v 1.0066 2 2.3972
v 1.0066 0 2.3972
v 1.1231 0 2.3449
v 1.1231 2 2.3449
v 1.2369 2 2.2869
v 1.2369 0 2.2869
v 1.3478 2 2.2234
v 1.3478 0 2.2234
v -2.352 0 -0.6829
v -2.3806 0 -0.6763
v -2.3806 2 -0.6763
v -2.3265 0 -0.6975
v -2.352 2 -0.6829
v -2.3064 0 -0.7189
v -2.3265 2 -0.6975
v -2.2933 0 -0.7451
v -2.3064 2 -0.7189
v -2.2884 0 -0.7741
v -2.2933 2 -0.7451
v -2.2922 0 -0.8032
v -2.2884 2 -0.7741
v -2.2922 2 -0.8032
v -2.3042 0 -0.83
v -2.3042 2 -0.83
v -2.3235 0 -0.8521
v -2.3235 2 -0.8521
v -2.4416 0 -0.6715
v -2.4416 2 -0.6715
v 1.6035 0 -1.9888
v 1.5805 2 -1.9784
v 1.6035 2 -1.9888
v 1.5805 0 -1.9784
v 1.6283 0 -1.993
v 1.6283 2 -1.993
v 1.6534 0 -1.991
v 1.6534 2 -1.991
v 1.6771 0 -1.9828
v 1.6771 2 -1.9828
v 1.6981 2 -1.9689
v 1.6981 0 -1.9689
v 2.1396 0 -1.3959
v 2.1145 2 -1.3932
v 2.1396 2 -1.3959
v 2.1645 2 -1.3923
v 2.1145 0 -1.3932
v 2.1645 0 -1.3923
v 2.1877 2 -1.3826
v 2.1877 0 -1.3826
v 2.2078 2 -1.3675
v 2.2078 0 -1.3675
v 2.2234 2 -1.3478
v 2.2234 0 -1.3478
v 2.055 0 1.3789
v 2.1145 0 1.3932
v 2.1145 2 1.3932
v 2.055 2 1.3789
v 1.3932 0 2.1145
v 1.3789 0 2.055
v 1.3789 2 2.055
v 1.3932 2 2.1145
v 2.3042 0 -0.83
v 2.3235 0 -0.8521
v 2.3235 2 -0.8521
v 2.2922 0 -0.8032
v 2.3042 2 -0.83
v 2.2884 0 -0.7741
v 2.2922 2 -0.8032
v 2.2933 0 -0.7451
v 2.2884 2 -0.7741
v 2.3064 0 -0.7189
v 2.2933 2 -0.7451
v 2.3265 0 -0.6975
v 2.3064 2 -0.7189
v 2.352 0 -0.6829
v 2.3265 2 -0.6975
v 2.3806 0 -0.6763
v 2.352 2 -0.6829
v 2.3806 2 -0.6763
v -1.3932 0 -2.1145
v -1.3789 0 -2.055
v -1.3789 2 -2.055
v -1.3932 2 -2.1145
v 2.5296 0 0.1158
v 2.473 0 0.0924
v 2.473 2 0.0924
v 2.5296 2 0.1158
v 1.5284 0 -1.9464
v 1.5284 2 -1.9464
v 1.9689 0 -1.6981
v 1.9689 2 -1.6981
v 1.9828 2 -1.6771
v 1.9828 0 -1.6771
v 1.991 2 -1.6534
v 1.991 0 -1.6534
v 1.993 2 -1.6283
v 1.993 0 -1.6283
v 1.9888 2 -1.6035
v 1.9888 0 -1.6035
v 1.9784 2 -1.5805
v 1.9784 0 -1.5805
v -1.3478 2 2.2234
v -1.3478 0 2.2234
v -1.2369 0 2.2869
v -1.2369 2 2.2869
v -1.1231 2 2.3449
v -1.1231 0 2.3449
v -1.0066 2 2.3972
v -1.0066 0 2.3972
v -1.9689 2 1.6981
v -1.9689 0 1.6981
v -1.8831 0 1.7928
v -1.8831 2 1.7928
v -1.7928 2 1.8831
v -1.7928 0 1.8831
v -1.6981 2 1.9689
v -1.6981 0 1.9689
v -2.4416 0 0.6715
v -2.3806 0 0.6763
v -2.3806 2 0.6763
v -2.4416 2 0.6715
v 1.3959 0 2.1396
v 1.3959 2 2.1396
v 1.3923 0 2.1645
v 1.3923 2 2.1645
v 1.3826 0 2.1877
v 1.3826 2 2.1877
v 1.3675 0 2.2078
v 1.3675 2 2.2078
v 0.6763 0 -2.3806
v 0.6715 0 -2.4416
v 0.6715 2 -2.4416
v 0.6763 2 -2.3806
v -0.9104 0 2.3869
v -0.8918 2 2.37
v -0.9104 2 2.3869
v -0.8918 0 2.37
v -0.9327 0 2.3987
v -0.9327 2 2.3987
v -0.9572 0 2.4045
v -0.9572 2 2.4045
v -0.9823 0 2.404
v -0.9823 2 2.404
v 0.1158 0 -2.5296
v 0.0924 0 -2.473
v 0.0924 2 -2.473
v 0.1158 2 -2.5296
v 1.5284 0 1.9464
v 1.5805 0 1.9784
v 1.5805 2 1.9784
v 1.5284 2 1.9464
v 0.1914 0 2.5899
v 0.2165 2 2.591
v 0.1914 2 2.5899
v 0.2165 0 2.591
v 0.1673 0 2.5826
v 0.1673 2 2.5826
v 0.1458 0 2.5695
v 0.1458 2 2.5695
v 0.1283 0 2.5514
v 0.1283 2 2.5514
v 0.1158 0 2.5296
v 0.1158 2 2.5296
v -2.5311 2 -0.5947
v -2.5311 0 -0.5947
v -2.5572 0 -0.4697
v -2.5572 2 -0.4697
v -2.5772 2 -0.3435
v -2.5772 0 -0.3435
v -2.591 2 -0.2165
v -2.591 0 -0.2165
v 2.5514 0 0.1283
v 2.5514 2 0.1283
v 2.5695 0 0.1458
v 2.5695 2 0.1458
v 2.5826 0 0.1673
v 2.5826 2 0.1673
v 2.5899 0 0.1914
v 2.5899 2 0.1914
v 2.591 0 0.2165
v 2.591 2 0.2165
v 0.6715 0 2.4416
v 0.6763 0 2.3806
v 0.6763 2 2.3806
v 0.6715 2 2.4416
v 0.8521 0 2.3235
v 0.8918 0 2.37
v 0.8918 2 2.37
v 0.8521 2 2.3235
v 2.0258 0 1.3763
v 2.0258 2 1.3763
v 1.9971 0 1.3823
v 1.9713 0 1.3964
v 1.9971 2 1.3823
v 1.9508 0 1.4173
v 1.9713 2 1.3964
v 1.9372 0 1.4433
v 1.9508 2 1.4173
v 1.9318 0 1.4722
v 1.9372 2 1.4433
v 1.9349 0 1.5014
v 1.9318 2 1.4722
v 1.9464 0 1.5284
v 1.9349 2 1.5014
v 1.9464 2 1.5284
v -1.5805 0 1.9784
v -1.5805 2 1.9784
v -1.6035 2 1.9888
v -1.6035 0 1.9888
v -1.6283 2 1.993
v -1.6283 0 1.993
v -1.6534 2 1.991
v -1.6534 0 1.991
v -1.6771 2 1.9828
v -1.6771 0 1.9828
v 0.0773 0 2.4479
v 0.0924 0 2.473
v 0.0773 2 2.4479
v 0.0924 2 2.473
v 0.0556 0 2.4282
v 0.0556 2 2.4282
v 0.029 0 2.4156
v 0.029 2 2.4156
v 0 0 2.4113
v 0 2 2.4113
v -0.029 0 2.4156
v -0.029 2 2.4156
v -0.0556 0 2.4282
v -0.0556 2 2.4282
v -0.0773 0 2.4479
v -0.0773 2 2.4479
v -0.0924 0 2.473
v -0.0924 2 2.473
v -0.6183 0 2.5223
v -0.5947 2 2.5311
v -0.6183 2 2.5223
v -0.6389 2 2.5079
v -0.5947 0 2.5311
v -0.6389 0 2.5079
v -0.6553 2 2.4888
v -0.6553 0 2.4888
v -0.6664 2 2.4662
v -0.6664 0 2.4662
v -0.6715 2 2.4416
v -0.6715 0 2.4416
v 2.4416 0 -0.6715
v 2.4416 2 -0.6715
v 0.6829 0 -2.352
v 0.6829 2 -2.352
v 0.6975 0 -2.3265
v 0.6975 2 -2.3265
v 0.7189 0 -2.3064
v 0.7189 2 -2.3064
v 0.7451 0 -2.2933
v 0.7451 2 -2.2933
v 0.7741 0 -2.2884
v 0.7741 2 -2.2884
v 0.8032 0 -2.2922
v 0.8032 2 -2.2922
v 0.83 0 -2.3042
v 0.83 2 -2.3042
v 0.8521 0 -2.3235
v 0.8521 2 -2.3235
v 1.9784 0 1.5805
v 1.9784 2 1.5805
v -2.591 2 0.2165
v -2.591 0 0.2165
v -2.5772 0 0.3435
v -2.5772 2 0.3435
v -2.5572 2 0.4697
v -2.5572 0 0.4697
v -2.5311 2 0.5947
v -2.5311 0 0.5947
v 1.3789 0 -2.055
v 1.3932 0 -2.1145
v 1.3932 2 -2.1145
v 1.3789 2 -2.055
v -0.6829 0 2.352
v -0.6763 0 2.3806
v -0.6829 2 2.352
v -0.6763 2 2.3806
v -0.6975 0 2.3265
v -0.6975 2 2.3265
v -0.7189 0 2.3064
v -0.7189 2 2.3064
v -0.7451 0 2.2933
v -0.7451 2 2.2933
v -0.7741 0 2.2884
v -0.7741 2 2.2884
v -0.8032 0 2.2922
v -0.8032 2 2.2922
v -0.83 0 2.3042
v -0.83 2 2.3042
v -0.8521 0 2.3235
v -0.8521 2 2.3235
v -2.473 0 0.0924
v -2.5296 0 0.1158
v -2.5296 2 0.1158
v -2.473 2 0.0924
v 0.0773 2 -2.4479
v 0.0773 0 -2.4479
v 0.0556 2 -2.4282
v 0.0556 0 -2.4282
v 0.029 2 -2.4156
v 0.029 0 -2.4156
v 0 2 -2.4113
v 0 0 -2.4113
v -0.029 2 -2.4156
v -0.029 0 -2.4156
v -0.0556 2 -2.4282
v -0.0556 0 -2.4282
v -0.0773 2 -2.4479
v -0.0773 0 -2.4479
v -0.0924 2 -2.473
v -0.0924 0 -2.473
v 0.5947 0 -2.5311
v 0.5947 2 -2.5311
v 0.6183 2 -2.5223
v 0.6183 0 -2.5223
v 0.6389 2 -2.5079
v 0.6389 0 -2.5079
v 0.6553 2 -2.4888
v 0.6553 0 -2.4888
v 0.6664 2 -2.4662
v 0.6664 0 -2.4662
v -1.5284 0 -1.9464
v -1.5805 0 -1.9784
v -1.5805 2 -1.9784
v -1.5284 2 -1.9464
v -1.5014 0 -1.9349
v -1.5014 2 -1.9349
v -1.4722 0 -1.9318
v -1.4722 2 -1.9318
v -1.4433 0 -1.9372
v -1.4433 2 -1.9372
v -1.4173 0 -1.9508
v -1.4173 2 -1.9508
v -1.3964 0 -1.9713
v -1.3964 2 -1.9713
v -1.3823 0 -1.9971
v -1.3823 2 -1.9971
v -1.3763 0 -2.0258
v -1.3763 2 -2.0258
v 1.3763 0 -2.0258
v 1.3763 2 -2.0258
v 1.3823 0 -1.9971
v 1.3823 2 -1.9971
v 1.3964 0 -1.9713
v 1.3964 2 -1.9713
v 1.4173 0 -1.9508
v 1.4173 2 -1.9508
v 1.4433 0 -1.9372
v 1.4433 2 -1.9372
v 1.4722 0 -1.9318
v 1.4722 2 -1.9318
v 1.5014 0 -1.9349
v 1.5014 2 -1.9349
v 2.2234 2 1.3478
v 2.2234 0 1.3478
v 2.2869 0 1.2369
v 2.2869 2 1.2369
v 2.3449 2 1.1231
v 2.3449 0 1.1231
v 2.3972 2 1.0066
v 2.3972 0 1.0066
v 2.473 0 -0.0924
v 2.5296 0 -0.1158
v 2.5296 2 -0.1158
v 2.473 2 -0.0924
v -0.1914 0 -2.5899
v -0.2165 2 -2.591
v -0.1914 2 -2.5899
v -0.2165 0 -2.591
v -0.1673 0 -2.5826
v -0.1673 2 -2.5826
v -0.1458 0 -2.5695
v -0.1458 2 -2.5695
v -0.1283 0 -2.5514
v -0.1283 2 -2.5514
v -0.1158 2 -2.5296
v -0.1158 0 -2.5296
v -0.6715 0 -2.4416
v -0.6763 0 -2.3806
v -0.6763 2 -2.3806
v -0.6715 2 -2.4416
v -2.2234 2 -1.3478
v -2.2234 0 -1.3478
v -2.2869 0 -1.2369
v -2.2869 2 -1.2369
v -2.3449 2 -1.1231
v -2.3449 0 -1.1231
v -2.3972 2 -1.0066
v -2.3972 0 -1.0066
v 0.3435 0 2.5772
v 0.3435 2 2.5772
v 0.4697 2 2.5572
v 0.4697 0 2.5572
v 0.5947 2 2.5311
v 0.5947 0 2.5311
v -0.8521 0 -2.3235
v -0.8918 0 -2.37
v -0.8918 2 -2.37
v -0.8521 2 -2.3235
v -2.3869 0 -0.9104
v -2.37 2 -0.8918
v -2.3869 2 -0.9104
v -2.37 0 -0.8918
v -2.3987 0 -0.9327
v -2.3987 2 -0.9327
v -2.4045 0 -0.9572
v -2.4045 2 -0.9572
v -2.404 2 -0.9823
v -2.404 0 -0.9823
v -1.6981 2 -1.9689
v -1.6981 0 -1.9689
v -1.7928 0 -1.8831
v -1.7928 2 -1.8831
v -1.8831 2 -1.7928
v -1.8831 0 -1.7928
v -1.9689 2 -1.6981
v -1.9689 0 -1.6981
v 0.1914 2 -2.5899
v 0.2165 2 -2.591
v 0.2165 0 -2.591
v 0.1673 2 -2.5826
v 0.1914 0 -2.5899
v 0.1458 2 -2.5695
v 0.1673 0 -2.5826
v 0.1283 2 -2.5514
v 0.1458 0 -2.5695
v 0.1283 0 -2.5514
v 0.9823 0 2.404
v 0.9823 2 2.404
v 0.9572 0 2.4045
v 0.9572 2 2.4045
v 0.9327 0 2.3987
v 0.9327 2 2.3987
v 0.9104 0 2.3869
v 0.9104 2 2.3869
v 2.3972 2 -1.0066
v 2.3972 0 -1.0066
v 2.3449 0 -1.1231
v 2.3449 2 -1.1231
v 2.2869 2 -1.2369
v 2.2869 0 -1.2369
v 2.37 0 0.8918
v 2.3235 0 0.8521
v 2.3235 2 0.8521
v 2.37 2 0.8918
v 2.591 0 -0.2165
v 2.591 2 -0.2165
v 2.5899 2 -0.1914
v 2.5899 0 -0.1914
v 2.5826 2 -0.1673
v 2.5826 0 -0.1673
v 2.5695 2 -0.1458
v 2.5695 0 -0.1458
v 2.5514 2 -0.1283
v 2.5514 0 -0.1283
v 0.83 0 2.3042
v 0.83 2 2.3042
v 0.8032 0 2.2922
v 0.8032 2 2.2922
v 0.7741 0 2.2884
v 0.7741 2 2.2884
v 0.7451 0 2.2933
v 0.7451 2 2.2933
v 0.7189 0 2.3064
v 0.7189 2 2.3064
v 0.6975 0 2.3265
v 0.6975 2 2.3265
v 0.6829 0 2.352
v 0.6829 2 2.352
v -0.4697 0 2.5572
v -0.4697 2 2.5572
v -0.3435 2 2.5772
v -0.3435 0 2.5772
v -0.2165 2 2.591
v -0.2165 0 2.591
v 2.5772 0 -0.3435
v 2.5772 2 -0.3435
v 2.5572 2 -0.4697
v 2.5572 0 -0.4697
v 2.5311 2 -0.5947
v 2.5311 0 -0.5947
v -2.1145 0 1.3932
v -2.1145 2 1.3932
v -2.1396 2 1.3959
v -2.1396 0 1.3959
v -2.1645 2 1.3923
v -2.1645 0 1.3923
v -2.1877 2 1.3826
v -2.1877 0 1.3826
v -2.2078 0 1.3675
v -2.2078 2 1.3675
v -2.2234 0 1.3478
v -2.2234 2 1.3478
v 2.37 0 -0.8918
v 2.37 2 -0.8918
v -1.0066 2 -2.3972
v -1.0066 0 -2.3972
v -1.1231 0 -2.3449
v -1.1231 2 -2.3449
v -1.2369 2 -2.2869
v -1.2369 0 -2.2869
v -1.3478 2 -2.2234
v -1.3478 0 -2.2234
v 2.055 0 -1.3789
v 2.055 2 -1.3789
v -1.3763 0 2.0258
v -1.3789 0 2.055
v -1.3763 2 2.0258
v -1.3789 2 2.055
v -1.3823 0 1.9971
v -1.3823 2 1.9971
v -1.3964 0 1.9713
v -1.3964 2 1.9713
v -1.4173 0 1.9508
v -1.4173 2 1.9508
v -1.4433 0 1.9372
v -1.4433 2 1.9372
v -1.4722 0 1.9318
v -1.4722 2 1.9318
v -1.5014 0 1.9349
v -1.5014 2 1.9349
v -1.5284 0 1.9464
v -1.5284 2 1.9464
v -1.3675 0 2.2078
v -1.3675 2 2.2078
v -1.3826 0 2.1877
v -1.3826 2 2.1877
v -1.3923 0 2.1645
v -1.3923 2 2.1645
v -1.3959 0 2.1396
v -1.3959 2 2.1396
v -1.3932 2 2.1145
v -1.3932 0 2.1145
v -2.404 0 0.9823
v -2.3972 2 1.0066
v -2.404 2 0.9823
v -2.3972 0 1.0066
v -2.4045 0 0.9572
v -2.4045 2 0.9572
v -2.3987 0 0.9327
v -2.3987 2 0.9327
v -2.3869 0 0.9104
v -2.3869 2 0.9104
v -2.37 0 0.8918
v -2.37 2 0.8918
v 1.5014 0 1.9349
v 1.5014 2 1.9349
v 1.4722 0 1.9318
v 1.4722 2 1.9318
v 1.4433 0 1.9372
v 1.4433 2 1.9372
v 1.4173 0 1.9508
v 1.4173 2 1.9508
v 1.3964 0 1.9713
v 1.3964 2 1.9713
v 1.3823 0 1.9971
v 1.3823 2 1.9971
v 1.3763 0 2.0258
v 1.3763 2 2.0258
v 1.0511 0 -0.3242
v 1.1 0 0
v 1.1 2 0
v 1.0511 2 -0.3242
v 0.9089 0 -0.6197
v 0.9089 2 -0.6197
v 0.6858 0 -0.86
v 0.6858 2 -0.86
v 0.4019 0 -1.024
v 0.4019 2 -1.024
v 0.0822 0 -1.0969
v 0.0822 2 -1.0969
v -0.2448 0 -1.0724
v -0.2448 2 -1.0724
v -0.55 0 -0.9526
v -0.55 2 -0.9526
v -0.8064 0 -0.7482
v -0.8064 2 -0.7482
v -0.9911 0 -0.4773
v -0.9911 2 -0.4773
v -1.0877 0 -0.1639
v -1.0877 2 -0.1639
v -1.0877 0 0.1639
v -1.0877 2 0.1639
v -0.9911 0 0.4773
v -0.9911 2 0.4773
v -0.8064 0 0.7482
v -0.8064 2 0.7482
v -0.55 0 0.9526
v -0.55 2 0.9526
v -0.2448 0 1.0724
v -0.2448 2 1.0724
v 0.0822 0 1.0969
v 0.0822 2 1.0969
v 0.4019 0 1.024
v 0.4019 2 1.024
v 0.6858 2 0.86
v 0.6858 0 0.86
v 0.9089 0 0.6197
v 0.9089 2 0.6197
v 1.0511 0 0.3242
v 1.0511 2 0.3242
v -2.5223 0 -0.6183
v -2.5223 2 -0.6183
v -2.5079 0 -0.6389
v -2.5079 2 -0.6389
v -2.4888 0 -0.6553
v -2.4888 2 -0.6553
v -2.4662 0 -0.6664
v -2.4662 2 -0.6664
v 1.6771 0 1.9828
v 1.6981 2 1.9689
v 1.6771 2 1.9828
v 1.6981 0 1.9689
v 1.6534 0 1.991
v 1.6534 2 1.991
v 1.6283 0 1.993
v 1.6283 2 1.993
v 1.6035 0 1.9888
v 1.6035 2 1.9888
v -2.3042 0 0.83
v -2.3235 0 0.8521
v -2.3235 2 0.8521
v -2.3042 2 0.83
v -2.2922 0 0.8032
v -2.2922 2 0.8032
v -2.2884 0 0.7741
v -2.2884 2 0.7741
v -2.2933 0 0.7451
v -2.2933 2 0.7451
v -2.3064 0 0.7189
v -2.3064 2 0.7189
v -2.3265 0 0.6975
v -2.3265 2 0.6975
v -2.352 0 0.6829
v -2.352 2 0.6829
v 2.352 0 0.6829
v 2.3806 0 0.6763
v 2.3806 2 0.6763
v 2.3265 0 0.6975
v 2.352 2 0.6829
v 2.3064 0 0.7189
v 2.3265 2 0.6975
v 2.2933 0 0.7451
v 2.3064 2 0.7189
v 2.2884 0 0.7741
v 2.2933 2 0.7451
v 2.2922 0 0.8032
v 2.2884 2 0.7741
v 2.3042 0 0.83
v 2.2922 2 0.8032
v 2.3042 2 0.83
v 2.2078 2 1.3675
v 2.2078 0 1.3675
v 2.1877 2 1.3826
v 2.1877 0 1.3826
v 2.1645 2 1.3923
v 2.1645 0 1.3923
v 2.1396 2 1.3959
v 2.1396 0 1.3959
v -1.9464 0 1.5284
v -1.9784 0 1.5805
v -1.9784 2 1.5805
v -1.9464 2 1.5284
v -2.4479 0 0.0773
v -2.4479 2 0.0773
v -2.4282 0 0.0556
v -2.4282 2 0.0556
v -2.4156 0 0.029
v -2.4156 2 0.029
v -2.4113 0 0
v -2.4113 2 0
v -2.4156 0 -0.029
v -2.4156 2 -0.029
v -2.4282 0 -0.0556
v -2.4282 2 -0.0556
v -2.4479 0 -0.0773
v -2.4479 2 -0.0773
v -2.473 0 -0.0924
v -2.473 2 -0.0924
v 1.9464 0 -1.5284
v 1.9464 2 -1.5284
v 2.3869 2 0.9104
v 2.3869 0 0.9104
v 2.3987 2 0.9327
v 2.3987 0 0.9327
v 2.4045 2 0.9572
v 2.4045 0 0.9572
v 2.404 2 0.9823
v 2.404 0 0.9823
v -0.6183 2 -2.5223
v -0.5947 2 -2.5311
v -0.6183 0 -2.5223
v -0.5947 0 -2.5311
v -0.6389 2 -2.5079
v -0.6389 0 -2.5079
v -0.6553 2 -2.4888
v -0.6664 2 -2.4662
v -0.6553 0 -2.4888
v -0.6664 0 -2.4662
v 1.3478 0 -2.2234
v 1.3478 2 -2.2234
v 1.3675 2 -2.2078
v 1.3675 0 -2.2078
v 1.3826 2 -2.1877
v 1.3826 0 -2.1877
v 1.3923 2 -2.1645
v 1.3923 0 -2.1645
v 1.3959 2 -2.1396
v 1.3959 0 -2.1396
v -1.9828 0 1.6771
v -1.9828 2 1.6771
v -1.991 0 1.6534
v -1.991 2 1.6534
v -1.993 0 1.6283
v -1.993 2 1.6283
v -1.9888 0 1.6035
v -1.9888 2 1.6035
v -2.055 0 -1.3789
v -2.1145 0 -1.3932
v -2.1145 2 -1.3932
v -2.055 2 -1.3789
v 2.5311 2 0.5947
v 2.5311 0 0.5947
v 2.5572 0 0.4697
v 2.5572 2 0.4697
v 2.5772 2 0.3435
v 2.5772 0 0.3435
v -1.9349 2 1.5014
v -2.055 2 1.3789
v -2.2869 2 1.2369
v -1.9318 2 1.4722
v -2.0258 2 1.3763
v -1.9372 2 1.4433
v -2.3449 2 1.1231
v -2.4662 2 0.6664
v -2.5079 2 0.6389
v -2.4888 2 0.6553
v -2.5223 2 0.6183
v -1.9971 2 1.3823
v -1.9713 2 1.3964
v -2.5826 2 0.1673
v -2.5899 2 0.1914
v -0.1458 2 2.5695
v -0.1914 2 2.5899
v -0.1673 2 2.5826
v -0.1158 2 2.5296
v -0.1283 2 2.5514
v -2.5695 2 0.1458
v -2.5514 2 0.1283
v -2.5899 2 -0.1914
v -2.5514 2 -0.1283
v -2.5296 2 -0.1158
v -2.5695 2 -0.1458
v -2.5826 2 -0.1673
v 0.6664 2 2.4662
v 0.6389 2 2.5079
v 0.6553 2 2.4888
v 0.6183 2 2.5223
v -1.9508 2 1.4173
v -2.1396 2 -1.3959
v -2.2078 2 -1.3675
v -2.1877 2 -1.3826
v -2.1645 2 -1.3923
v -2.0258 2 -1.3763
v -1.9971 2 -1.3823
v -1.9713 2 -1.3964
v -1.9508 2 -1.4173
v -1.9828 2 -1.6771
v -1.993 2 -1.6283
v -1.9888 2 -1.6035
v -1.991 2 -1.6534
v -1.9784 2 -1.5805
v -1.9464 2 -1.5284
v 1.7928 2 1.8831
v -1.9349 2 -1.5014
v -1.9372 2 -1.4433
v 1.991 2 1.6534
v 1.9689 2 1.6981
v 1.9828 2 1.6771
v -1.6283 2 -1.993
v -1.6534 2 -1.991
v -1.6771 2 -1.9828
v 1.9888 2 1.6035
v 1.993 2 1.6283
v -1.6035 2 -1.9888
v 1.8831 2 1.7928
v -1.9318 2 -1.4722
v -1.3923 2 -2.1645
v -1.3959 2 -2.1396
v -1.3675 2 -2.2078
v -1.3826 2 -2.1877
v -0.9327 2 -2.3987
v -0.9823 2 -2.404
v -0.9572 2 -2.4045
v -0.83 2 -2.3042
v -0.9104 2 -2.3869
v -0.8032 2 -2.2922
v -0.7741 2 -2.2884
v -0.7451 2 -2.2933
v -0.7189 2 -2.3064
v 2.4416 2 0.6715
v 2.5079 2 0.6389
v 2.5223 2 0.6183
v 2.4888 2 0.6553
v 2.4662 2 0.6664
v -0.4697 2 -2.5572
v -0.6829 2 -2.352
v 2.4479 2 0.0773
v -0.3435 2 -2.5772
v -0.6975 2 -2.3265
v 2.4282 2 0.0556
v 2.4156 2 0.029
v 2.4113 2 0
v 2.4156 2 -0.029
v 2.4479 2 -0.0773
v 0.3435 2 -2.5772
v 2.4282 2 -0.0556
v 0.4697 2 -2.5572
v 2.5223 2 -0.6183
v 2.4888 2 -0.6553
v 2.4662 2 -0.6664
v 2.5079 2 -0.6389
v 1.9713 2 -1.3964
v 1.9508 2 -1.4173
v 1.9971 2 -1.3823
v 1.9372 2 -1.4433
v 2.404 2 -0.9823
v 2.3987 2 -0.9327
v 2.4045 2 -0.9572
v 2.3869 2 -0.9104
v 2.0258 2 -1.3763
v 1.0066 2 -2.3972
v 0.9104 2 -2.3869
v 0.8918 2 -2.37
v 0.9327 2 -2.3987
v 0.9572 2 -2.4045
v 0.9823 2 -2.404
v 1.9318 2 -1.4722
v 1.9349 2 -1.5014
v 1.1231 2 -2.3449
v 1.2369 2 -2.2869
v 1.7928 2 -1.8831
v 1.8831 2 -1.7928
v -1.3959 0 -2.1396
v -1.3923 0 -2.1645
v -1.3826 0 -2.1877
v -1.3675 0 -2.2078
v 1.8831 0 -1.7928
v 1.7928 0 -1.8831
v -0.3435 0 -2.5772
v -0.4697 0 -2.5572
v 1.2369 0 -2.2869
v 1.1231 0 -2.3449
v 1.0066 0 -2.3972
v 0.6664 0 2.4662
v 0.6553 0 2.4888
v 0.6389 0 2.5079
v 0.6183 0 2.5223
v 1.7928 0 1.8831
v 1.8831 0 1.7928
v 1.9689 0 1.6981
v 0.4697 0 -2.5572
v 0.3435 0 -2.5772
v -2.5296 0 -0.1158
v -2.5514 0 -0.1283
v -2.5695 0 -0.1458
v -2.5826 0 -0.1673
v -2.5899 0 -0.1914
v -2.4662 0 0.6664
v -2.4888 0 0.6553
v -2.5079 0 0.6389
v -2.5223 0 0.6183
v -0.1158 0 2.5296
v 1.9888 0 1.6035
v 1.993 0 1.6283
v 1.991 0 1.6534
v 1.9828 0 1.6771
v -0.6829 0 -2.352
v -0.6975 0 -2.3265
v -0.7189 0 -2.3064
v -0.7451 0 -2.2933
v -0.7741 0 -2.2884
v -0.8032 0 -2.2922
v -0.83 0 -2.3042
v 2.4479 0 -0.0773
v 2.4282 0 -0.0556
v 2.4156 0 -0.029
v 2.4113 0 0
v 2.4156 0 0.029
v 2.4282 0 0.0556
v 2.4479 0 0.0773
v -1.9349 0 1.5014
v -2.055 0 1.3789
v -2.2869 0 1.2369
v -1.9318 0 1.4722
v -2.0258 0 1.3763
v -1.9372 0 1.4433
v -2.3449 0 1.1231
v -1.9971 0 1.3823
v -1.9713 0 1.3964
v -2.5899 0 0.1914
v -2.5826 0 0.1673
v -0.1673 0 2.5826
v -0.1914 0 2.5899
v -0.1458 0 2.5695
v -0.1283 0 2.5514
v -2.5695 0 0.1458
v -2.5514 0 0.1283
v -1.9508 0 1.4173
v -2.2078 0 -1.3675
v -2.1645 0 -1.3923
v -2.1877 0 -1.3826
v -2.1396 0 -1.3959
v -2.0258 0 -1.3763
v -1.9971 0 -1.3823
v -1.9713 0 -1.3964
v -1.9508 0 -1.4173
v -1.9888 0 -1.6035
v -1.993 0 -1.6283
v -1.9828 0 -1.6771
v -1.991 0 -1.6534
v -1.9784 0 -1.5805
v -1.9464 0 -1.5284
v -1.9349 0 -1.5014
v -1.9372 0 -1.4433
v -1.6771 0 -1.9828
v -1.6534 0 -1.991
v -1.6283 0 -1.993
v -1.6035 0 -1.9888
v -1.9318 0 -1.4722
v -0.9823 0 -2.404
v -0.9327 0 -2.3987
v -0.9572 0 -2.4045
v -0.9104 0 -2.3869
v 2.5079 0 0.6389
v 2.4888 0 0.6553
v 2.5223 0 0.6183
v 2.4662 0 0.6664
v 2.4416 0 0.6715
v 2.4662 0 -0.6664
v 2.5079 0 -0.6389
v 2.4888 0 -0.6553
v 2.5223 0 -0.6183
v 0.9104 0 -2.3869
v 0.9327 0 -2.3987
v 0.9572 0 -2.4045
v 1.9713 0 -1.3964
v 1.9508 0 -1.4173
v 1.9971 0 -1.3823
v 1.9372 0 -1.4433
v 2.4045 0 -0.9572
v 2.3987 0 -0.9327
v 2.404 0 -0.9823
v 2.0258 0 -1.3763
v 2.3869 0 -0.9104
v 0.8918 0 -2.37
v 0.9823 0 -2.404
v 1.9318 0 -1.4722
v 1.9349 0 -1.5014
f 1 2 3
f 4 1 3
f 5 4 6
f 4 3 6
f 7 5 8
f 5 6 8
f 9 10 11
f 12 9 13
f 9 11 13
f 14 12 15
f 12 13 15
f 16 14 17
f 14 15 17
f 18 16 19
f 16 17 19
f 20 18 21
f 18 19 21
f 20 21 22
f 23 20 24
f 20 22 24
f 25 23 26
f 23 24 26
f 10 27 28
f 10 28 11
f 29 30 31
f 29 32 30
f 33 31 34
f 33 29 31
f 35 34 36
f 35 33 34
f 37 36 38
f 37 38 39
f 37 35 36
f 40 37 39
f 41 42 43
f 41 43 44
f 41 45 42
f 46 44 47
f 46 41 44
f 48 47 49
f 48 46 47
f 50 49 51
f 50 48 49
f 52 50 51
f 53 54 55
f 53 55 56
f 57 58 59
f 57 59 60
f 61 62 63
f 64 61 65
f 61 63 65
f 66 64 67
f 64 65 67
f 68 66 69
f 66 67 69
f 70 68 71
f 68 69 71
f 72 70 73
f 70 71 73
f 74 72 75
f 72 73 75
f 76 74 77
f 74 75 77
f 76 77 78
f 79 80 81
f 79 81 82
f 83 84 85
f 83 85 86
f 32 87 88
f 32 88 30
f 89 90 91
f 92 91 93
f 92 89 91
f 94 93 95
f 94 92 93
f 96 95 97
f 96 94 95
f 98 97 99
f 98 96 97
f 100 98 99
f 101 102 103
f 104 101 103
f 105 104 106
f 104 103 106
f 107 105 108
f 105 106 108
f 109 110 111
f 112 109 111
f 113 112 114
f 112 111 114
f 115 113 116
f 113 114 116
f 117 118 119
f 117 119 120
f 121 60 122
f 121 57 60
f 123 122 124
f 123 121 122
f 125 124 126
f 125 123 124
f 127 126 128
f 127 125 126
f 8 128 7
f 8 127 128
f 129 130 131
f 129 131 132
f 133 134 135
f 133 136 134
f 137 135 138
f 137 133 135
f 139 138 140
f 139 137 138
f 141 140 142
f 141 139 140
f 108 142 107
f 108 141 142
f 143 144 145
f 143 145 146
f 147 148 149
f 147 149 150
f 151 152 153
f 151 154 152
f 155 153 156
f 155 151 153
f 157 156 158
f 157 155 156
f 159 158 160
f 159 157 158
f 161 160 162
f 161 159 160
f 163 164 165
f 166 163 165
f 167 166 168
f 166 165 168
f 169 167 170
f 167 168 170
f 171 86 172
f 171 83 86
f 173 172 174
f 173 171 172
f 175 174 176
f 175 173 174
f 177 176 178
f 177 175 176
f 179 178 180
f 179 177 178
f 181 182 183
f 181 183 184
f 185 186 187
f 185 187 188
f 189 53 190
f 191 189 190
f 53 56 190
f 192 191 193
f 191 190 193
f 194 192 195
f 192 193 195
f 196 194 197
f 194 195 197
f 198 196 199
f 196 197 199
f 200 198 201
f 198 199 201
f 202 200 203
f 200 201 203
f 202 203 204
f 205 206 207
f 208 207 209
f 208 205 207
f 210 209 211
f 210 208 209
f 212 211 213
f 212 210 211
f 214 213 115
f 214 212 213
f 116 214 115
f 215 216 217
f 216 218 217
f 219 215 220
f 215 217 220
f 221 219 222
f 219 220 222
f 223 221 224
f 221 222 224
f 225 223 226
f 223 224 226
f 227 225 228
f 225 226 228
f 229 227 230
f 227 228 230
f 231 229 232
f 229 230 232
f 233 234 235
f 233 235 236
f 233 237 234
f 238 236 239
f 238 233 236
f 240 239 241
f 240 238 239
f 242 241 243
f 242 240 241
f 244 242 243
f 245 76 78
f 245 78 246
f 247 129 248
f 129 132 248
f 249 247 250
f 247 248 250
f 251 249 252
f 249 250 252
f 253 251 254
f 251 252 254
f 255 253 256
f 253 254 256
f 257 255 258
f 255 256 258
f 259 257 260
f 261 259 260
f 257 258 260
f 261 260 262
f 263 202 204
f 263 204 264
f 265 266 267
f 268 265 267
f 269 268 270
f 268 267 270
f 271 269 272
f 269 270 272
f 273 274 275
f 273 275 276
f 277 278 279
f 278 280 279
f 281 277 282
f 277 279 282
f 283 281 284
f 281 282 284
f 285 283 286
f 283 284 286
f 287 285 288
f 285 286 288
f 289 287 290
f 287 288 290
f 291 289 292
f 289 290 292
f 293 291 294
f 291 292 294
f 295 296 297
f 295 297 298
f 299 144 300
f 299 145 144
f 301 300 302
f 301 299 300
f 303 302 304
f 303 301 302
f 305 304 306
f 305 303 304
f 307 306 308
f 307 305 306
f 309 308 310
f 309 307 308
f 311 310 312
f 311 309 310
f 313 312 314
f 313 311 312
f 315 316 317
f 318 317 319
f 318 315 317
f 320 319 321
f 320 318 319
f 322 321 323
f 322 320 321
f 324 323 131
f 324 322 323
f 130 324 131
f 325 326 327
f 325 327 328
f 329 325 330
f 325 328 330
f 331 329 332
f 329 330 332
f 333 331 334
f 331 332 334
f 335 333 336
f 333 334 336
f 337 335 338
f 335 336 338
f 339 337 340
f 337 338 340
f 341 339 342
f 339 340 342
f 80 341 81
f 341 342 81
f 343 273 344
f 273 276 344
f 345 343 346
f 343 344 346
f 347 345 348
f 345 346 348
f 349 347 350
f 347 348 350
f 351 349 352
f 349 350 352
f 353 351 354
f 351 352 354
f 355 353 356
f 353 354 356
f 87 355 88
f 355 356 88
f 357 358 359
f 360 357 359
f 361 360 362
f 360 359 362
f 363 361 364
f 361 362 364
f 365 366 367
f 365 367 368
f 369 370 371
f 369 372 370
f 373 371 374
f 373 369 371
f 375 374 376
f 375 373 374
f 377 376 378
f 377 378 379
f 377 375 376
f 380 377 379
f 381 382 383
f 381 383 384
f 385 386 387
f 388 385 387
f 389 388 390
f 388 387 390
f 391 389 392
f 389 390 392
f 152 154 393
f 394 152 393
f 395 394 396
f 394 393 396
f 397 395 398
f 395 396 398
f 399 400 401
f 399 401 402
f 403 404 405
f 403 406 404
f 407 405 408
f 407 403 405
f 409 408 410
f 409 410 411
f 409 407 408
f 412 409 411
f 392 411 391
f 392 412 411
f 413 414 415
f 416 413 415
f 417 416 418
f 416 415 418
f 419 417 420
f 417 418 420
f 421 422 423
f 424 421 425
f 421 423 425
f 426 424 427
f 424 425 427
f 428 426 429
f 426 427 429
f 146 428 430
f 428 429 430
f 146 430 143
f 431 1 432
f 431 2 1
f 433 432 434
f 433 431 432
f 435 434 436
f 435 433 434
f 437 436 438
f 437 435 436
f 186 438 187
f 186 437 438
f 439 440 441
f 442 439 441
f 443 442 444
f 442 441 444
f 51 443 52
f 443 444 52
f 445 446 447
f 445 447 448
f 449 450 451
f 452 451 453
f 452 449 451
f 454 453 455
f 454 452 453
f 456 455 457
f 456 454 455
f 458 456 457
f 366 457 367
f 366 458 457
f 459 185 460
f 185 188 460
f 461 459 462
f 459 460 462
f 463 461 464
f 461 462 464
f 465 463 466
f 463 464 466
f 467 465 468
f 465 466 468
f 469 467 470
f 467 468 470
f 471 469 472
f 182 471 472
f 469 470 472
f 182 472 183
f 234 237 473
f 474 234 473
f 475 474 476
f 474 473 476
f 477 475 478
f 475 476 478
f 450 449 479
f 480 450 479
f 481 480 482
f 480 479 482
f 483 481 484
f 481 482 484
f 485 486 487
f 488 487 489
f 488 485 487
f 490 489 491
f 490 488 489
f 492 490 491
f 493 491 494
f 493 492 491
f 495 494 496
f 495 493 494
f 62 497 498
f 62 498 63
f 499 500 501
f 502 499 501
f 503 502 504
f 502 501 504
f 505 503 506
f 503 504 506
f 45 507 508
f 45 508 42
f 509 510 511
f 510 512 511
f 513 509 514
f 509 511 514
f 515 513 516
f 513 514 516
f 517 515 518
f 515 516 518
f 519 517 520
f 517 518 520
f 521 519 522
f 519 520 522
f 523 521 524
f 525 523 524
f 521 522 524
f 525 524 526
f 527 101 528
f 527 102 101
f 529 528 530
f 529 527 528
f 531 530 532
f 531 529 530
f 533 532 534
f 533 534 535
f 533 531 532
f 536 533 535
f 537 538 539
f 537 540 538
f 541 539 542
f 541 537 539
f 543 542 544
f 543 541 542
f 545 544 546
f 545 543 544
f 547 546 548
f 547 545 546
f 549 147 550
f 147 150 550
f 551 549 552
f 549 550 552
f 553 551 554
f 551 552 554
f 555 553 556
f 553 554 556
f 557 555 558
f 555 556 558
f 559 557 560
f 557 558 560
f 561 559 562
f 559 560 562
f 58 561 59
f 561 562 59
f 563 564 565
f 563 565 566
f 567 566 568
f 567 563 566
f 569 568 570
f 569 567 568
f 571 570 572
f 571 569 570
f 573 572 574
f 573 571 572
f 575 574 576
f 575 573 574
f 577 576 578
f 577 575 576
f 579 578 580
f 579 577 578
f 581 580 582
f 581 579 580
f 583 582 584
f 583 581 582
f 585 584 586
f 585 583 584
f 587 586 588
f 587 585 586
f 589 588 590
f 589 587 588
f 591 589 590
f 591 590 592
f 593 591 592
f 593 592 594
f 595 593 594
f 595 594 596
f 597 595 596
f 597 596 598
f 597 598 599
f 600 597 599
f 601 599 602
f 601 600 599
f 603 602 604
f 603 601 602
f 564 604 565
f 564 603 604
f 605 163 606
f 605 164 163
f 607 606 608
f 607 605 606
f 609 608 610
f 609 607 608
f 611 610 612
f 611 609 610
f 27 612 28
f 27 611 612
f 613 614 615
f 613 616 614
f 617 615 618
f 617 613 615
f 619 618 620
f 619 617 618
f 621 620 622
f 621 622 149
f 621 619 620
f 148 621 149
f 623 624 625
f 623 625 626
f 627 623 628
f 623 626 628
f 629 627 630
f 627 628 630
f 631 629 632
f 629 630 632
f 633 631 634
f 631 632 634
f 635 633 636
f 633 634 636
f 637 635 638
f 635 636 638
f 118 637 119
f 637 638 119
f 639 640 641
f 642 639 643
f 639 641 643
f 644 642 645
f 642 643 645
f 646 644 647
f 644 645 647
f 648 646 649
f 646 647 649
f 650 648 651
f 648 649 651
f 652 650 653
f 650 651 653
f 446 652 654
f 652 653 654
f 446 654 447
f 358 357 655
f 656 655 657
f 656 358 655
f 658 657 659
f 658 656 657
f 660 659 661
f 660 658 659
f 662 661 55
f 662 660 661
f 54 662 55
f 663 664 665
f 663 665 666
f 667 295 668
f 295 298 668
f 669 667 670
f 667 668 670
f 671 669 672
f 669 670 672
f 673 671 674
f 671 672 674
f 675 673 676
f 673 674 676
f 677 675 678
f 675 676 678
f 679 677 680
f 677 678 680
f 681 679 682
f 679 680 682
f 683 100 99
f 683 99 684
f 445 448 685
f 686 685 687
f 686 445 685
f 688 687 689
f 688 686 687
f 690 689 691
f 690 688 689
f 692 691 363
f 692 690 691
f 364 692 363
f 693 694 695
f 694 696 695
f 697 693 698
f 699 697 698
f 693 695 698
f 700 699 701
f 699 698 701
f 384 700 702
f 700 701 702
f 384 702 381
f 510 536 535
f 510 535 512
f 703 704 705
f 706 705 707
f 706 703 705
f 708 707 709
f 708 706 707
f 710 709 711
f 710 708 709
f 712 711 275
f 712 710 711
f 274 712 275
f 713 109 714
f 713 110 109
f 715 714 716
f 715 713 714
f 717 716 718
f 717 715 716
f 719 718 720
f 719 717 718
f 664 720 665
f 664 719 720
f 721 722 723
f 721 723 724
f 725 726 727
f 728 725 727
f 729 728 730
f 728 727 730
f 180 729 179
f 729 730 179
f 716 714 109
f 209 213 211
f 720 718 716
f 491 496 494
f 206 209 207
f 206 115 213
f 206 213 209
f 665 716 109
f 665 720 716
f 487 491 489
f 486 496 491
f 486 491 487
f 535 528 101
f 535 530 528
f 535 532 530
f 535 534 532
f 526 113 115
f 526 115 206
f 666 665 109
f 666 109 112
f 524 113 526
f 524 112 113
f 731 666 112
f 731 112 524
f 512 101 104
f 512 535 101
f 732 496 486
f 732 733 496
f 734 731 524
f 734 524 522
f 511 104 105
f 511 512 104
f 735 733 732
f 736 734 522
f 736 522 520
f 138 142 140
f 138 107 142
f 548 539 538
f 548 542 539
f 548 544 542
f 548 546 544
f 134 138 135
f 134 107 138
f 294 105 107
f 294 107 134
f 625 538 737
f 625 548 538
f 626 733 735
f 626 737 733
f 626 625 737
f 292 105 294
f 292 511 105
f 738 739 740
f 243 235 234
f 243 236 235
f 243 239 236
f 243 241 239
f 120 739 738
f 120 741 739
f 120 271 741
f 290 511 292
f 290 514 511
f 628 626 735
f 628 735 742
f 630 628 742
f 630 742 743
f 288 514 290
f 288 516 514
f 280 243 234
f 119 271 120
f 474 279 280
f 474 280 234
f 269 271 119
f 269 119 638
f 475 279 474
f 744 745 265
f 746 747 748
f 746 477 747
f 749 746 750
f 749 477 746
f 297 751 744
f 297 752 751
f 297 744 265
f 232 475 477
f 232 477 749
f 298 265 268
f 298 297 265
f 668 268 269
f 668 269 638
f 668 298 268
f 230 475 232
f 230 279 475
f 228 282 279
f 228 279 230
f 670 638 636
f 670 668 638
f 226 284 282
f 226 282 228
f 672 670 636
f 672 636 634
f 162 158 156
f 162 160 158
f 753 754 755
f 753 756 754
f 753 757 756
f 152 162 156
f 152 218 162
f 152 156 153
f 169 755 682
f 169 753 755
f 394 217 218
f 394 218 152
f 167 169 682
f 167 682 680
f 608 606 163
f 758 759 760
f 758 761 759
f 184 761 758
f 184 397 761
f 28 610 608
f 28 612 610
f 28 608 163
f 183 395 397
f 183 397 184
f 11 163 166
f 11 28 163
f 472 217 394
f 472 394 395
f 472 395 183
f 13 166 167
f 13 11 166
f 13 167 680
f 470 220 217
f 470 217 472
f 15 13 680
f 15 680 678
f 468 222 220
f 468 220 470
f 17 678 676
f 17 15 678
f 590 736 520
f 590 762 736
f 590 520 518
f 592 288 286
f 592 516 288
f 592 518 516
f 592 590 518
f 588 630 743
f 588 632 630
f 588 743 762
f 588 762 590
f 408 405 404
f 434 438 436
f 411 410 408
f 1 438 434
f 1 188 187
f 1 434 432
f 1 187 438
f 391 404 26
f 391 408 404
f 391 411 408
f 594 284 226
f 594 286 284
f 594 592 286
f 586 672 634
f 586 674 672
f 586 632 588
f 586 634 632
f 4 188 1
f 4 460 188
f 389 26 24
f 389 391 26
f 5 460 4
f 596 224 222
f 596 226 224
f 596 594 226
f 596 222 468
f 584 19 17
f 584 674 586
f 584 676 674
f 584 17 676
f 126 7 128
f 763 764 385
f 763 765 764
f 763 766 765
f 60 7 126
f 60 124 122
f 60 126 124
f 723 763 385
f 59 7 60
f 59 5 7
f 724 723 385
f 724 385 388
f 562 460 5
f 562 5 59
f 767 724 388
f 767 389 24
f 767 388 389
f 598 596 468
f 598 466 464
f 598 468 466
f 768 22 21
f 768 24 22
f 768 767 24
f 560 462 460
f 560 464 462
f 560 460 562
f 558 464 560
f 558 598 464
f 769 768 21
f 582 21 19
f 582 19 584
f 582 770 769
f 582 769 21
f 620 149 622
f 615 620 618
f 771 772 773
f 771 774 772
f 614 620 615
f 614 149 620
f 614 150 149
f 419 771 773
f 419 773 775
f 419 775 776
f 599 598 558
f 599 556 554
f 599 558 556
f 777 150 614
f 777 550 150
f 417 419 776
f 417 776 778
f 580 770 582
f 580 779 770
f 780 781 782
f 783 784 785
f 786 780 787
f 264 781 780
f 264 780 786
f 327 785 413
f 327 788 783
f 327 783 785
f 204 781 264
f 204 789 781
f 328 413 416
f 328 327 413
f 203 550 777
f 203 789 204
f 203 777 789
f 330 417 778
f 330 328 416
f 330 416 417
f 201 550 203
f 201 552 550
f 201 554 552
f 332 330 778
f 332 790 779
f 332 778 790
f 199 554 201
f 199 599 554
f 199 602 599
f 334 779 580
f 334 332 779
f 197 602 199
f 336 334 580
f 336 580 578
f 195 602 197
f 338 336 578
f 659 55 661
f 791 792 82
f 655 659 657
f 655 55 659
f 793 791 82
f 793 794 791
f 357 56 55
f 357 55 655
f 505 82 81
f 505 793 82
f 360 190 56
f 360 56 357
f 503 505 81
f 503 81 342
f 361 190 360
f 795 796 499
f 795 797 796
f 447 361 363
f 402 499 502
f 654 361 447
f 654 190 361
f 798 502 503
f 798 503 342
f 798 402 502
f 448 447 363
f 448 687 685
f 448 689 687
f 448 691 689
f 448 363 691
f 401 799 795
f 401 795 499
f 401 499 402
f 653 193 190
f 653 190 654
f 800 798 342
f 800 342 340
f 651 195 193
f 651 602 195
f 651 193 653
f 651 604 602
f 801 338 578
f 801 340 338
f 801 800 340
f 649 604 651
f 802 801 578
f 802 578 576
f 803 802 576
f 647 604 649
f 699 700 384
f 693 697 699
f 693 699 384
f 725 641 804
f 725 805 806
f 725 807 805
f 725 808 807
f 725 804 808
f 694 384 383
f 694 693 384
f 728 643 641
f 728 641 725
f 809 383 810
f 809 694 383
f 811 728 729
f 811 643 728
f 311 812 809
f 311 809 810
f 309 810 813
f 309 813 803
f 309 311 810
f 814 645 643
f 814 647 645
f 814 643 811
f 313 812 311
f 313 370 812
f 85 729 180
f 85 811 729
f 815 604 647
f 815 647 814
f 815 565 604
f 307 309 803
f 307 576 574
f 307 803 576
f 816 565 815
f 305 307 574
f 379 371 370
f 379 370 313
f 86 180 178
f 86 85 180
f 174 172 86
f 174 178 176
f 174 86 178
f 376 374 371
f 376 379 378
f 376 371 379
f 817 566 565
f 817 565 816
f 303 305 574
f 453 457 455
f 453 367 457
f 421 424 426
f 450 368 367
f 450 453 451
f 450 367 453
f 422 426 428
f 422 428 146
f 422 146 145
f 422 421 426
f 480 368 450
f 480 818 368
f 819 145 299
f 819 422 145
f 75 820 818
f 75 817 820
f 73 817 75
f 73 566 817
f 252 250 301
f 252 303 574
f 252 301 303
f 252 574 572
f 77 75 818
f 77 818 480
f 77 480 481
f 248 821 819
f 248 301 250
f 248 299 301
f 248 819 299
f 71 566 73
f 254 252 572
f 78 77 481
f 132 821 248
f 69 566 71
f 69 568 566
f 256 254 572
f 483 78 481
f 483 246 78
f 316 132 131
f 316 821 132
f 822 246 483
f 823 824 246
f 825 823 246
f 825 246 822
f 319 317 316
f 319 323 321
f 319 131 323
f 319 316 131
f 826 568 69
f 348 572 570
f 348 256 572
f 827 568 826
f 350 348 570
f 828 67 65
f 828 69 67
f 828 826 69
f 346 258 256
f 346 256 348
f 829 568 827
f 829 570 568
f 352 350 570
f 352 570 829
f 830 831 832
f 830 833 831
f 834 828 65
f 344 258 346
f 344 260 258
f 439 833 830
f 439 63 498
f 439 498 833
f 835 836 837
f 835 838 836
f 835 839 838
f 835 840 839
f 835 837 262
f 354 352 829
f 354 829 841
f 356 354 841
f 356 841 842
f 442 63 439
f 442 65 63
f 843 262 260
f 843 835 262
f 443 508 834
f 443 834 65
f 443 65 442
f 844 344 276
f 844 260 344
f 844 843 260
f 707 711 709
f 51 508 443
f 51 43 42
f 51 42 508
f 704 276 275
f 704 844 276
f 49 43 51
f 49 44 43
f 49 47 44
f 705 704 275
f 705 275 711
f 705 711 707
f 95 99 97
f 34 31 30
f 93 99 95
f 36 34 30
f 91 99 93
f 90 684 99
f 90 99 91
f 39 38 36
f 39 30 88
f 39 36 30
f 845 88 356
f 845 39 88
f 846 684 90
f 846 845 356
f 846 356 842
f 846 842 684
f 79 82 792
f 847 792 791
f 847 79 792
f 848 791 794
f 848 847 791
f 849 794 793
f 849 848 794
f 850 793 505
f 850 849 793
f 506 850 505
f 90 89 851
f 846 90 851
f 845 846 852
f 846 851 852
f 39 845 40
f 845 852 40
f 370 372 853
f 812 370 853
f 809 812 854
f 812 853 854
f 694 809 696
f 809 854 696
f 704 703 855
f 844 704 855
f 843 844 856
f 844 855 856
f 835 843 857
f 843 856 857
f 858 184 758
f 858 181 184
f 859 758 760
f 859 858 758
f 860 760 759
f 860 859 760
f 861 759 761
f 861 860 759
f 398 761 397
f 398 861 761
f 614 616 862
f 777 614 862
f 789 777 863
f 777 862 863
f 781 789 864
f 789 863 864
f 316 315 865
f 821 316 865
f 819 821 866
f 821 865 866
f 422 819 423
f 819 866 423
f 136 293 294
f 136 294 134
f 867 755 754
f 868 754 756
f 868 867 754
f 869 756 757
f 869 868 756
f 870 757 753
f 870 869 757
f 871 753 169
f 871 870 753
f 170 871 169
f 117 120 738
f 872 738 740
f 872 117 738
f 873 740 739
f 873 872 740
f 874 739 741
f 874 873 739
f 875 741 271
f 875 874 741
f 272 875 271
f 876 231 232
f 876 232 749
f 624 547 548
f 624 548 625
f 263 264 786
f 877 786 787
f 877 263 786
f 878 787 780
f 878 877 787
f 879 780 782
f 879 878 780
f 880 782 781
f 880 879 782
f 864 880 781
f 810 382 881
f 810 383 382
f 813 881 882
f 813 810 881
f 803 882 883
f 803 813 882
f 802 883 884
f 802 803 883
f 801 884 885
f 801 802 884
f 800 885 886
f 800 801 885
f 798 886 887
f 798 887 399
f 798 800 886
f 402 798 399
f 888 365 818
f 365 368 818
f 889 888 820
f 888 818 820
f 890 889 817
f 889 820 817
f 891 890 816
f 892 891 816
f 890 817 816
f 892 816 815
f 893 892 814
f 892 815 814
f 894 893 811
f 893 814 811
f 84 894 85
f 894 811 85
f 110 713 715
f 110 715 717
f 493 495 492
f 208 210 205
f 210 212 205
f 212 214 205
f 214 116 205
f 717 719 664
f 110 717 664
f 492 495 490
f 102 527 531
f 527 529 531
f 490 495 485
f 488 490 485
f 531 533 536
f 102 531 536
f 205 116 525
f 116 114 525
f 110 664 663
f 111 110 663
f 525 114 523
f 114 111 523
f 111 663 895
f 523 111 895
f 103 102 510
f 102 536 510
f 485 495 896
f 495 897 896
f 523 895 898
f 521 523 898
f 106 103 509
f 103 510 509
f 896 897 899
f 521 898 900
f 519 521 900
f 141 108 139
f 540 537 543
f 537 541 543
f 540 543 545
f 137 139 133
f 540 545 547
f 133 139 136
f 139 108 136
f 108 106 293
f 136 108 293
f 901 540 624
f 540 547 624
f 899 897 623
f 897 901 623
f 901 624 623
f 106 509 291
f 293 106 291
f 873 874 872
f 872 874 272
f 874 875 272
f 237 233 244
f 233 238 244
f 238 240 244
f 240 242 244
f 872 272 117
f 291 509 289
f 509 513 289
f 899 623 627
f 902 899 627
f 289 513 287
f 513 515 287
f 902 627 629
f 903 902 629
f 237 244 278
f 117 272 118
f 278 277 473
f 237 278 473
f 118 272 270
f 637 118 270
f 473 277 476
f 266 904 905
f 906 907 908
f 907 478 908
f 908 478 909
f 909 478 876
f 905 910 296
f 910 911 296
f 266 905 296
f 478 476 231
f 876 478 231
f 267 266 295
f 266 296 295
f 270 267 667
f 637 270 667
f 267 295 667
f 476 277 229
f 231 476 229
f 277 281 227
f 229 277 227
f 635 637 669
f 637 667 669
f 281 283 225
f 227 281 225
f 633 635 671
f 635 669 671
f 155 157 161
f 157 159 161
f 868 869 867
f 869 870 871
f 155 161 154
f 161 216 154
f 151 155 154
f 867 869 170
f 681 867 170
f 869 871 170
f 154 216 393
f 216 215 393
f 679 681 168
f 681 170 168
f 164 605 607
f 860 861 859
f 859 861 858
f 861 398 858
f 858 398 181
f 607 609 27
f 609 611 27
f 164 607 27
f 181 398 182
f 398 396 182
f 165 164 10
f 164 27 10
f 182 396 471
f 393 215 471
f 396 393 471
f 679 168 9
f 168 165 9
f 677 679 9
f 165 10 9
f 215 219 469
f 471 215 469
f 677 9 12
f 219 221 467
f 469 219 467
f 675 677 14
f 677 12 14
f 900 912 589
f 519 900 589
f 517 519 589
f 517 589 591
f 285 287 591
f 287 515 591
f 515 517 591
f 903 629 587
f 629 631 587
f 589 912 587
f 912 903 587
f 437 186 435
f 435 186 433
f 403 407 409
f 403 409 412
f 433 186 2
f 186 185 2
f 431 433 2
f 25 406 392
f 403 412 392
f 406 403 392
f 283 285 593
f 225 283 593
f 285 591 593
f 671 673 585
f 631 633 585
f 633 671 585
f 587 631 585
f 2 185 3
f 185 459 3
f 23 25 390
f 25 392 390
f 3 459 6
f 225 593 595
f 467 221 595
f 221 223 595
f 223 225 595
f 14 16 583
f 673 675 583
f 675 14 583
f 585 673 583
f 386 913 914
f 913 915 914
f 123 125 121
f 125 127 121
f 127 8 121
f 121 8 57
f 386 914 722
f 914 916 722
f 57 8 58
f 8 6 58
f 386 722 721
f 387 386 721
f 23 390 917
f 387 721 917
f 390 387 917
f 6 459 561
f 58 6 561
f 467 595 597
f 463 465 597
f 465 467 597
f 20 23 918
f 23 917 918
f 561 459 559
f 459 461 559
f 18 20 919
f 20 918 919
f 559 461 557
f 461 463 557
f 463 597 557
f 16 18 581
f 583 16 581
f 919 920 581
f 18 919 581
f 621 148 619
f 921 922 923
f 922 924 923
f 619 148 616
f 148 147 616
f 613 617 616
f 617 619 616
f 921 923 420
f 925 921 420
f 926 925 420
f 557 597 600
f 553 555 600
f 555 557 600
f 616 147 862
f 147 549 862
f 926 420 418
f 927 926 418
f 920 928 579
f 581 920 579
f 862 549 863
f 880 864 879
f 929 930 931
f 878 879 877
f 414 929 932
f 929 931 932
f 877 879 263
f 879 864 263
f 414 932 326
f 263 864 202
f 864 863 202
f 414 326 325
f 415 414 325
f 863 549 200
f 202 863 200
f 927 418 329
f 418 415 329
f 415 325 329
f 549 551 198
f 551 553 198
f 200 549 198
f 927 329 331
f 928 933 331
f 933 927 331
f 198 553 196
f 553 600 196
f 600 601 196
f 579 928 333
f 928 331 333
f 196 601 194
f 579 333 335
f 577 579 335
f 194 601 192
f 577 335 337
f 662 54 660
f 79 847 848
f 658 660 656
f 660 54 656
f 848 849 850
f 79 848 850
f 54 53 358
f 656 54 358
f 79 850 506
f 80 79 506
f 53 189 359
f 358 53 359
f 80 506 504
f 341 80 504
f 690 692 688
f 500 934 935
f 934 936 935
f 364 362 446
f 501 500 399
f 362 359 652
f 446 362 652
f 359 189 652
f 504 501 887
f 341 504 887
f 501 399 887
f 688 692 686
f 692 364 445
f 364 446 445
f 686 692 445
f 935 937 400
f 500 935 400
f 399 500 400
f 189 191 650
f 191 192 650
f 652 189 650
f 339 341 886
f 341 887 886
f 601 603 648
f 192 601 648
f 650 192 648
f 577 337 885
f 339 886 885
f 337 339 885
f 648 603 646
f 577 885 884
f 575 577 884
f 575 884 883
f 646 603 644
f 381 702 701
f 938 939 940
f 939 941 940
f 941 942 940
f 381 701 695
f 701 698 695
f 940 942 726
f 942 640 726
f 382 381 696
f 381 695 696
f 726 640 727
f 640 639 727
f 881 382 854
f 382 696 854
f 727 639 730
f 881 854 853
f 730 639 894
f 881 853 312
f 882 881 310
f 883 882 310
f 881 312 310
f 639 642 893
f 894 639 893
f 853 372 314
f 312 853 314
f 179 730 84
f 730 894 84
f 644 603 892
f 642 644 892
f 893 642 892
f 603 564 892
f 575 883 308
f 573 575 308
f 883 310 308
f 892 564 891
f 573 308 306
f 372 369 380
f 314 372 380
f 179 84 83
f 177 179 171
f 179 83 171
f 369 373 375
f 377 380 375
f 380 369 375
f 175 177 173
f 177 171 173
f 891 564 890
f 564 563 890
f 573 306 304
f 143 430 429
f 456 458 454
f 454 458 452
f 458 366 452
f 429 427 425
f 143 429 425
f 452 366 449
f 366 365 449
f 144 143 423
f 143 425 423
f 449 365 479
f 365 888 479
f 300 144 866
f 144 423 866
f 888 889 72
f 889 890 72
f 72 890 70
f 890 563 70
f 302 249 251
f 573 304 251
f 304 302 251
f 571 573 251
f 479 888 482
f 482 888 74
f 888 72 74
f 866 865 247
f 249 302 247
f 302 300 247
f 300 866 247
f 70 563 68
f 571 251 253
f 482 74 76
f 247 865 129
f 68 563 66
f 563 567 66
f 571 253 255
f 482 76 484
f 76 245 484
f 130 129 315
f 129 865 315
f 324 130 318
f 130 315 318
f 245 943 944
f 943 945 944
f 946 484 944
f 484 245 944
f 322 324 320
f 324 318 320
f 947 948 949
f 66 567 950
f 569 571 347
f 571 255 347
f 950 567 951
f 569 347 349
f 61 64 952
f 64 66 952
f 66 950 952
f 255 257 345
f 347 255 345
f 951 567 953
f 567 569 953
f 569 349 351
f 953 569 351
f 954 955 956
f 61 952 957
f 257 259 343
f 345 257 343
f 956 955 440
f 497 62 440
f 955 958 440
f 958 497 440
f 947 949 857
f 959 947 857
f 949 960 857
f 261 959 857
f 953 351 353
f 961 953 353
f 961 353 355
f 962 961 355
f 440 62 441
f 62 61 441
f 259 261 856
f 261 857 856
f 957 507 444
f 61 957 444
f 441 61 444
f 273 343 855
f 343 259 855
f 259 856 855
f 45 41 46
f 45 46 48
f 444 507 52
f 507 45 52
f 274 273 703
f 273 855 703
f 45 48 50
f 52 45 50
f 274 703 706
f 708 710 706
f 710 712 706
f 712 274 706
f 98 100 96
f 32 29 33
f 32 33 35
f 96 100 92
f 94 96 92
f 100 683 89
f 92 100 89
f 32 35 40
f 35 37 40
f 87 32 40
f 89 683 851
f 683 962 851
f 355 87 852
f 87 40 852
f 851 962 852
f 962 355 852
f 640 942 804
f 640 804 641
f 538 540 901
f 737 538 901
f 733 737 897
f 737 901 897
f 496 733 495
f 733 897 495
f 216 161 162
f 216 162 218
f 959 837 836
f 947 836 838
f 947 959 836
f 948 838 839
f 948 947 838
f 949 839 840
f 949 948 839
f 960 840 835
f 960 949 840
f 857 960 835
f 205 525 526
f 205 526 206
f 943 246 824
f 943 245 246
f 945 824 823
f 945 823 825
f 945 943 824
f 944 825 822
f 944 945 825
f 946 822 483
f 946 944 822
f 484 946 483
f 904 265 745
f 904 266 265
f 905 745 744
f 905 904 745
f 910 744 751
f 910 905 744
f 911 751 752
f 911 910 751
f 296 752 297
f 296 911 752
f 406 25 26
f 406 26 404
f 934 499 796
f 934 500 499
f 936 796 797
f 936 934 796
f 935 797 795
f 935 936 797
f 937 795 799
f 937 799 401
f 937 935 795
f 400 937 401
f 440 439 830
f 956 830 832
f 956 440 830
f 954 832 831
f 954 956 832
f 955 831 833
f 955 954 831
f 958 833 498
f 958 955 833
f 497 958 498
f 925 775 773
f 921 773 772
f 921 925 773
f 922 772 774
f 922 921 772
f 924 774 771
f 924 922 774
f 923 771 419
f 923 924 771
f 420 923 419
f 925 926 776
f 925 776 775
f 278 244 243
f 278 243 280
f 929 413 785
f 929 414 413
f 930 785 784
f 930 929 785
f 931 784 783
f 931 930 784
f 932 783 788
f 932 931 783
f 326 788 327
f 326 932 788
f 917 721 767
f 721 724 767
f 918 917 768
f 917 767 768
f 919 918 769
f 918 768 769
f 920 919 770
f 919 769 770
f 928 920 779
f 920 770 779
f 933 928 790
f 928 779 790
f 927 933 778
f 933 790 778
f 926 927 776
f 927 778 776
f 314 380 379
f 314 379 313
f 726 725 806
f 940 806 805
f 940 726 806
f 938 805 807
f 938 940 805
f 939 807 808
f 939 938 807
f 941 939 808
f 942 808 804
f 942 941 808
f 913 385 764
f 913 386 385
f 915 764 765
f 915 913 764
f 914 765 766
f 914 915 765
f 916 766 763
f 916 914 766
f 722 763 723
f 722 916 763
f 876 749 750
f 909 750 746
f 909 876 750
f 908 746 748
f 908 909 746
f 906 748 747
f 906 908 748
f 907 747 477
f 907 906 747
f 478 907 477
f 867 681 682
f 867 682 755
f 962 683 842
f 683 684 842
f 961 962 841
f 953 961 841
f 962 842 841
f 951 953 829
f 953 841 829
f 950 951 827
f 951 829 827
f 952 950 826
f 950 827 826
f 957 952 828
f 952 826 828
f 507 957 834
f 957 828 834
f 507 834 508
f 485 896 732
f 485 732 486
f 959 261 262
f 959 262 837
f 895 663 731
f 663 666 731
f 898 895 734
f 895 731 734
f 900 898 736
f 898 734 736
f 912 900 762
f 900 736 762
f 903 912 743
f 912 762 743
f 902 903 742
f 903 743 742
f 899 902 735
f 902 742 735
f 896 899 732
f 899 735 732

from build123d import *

# Parameters (mm, degrees)
SKETCH1_R                = 2.6
SKETCH1_R_2              = 1.1
BOSS_EXTRUDE1_DEPTH      = 2
CUT_EXTRUDE1_DEPTH       = 3
FILLET2_R                = 0.1
CIRPATTERN1_COUNT        = 20
FILLET2_OF_CIRPATTERN1_R = 0.1


with BuildPart() as part:
    # Sketch1 → Boss-Extrude1 (new body)
    with BuildSketch(Plane(origin=(0, 0, 0), x_dir=(1, 0, 0), z_dir=(0, 1, 0))):
        Circle(SKETCH1_R)
        Circle(SKETCH1_R_2, mode=Mode.SUBTRACT)
    extrude(amount=BOSS_EXTRUDE1_DEPTH)

    # Sketch2 → Cut-Extrude1 (cut, through all)
    with BuildSketch(Plane(origin=(0, 0, 0), x_dir=(1, 0, 0), z_dir=(0, 1, 0))):
        Polygon((-0.144974747, 2.6), (0, 2.25), (0.144974747, 2.6), align=None)
    cut_extrude1 = extrude(amount=CUT_EXTRUDE1_DEPTH, mode=Mode.SUBTRACT)

    # Fillet2
    fillet2_edges = [part.edges().sort_by_distance(p)[0] for p in [
        (0.143336922, 1, -2.596045941),
        (-0.143336922, 1, -2.596045941),
        (0, 1, -2.25),
    ]]
    fillet(fillet2_edges, radius=FILLET2_R)

    # CirPattern1: Cut-Extrude1 ×20 about axis
    cirpattern1_axis = Axis((0, 0, 0), (0, 1, 0))
    for i in range(1, CIRPATTERN1_COUNT):
        add(cut_extrude1.rotate(cirpattern1_axis, i * 360 / CIRPATTERN1_COUNT), mode=Mode.SUBTRACT)

    # Fillet2 of CirPattern1
    fillet2_of_cirpattern1_edges = [part.edges().sort_by_distance(p)[0] for p in [
        (-0.6659008, 1, -2.513279953),
        (-0.938543827, 1, -2.424692864),
        (-0.695288237, 1, -2.139877162),
        (-1.409955513, 1, -2.184496613),
        (-1.641879524, 1, -2.015993956),
        (-1.322516818, 1, -1.820288237),
        (-2.015993956, 1, -1.641879524),
        (-2.184496613, 1, -1.409955513),
        (-1.820288237, 1, -1.322516818),
        (-2.424692864, 1, -0.938543827),
        (-2.513279953, 1, -0.6659008),
        (-2.139877162, 1, -0.695288237),
        (-2.596045941, 1, -0.143336922),
        (-2.596045941, 1, 0.143336922),
        (-2.25, 1, 0),
        (-2.513279953, 1, 0.6659008),
        (-2.424692864, 1, 0.938543827),
        (-2.139877162, 1, 0.695288237),
        (-2.184496613, 1, 1.409955513),
        (-2.015993956, 1, 1.641879524),
        (-1.820288237, 1, 1.322516818),
        (-1.641879524, 1, 2.015993956),
        (-1.409955513, 1, 2.184496613),
        (-1.322516818, 1, 1.820288237),
        (-0.938543827, 1, 2.424692864),
        (-0.6659008, 1, 2.513279953),
        (-0.695288237, 1, 2.139877162),
        (-0.143336922, 1, 2.596045941),
        (0.143336922, 1, 2.596045941),
        (0, 1, 2.25),
        (0.6659008, 1, 2.513279953),
        (0.938543827, 1, 2.424692864),
        (0.695288237, 1, 2.139877162),
        (1.409955513, 1, 2.184496613),
        (1.641879524, 1, 2.015993956),
        (1.322516818, 1, 1.820288237),
        (2.015993956, 1, 1.641879524),
        (2.184496613, 1, 1.409955513),
        (1.820288237, 1, 1.322516818),
        (2.424692864, 1, 0.938543827),
        (2.513279953, 1, 0.6659008),
        (2.139877162, 1, 0.695288237),
        (2.596045941, 1, 0.143336922),
        (2.596045941, 1, -0.143336922),
        (2.25, 1, 0),
        (2.513279953, 1, -0.6659008),
        (2.424692864, 1, -0.938543827),
        (2.139877162, 1, -0.695288237),
        (2.184496613, 1, -1.409955513),
        (2.015993956, 1, -1.641879524),
        (1.820288237, 1, -1.322516818),
        (1.641879524, 1, -2.015993956),
        (1.409955513, 1, -2.184496613),
        (1.322516818, 1, -1.820288237),
        (0.938543827, 1, -2.424692864),
        (0.6659008, 1, -2.513279953),
        (0.695288237, 1, -2.139877162),
    ]]
    fillet(fillet2_of_cirpattern1_edges, radius=FILLET2_OF_CIRPATTERN1_R)


solid = part.part
